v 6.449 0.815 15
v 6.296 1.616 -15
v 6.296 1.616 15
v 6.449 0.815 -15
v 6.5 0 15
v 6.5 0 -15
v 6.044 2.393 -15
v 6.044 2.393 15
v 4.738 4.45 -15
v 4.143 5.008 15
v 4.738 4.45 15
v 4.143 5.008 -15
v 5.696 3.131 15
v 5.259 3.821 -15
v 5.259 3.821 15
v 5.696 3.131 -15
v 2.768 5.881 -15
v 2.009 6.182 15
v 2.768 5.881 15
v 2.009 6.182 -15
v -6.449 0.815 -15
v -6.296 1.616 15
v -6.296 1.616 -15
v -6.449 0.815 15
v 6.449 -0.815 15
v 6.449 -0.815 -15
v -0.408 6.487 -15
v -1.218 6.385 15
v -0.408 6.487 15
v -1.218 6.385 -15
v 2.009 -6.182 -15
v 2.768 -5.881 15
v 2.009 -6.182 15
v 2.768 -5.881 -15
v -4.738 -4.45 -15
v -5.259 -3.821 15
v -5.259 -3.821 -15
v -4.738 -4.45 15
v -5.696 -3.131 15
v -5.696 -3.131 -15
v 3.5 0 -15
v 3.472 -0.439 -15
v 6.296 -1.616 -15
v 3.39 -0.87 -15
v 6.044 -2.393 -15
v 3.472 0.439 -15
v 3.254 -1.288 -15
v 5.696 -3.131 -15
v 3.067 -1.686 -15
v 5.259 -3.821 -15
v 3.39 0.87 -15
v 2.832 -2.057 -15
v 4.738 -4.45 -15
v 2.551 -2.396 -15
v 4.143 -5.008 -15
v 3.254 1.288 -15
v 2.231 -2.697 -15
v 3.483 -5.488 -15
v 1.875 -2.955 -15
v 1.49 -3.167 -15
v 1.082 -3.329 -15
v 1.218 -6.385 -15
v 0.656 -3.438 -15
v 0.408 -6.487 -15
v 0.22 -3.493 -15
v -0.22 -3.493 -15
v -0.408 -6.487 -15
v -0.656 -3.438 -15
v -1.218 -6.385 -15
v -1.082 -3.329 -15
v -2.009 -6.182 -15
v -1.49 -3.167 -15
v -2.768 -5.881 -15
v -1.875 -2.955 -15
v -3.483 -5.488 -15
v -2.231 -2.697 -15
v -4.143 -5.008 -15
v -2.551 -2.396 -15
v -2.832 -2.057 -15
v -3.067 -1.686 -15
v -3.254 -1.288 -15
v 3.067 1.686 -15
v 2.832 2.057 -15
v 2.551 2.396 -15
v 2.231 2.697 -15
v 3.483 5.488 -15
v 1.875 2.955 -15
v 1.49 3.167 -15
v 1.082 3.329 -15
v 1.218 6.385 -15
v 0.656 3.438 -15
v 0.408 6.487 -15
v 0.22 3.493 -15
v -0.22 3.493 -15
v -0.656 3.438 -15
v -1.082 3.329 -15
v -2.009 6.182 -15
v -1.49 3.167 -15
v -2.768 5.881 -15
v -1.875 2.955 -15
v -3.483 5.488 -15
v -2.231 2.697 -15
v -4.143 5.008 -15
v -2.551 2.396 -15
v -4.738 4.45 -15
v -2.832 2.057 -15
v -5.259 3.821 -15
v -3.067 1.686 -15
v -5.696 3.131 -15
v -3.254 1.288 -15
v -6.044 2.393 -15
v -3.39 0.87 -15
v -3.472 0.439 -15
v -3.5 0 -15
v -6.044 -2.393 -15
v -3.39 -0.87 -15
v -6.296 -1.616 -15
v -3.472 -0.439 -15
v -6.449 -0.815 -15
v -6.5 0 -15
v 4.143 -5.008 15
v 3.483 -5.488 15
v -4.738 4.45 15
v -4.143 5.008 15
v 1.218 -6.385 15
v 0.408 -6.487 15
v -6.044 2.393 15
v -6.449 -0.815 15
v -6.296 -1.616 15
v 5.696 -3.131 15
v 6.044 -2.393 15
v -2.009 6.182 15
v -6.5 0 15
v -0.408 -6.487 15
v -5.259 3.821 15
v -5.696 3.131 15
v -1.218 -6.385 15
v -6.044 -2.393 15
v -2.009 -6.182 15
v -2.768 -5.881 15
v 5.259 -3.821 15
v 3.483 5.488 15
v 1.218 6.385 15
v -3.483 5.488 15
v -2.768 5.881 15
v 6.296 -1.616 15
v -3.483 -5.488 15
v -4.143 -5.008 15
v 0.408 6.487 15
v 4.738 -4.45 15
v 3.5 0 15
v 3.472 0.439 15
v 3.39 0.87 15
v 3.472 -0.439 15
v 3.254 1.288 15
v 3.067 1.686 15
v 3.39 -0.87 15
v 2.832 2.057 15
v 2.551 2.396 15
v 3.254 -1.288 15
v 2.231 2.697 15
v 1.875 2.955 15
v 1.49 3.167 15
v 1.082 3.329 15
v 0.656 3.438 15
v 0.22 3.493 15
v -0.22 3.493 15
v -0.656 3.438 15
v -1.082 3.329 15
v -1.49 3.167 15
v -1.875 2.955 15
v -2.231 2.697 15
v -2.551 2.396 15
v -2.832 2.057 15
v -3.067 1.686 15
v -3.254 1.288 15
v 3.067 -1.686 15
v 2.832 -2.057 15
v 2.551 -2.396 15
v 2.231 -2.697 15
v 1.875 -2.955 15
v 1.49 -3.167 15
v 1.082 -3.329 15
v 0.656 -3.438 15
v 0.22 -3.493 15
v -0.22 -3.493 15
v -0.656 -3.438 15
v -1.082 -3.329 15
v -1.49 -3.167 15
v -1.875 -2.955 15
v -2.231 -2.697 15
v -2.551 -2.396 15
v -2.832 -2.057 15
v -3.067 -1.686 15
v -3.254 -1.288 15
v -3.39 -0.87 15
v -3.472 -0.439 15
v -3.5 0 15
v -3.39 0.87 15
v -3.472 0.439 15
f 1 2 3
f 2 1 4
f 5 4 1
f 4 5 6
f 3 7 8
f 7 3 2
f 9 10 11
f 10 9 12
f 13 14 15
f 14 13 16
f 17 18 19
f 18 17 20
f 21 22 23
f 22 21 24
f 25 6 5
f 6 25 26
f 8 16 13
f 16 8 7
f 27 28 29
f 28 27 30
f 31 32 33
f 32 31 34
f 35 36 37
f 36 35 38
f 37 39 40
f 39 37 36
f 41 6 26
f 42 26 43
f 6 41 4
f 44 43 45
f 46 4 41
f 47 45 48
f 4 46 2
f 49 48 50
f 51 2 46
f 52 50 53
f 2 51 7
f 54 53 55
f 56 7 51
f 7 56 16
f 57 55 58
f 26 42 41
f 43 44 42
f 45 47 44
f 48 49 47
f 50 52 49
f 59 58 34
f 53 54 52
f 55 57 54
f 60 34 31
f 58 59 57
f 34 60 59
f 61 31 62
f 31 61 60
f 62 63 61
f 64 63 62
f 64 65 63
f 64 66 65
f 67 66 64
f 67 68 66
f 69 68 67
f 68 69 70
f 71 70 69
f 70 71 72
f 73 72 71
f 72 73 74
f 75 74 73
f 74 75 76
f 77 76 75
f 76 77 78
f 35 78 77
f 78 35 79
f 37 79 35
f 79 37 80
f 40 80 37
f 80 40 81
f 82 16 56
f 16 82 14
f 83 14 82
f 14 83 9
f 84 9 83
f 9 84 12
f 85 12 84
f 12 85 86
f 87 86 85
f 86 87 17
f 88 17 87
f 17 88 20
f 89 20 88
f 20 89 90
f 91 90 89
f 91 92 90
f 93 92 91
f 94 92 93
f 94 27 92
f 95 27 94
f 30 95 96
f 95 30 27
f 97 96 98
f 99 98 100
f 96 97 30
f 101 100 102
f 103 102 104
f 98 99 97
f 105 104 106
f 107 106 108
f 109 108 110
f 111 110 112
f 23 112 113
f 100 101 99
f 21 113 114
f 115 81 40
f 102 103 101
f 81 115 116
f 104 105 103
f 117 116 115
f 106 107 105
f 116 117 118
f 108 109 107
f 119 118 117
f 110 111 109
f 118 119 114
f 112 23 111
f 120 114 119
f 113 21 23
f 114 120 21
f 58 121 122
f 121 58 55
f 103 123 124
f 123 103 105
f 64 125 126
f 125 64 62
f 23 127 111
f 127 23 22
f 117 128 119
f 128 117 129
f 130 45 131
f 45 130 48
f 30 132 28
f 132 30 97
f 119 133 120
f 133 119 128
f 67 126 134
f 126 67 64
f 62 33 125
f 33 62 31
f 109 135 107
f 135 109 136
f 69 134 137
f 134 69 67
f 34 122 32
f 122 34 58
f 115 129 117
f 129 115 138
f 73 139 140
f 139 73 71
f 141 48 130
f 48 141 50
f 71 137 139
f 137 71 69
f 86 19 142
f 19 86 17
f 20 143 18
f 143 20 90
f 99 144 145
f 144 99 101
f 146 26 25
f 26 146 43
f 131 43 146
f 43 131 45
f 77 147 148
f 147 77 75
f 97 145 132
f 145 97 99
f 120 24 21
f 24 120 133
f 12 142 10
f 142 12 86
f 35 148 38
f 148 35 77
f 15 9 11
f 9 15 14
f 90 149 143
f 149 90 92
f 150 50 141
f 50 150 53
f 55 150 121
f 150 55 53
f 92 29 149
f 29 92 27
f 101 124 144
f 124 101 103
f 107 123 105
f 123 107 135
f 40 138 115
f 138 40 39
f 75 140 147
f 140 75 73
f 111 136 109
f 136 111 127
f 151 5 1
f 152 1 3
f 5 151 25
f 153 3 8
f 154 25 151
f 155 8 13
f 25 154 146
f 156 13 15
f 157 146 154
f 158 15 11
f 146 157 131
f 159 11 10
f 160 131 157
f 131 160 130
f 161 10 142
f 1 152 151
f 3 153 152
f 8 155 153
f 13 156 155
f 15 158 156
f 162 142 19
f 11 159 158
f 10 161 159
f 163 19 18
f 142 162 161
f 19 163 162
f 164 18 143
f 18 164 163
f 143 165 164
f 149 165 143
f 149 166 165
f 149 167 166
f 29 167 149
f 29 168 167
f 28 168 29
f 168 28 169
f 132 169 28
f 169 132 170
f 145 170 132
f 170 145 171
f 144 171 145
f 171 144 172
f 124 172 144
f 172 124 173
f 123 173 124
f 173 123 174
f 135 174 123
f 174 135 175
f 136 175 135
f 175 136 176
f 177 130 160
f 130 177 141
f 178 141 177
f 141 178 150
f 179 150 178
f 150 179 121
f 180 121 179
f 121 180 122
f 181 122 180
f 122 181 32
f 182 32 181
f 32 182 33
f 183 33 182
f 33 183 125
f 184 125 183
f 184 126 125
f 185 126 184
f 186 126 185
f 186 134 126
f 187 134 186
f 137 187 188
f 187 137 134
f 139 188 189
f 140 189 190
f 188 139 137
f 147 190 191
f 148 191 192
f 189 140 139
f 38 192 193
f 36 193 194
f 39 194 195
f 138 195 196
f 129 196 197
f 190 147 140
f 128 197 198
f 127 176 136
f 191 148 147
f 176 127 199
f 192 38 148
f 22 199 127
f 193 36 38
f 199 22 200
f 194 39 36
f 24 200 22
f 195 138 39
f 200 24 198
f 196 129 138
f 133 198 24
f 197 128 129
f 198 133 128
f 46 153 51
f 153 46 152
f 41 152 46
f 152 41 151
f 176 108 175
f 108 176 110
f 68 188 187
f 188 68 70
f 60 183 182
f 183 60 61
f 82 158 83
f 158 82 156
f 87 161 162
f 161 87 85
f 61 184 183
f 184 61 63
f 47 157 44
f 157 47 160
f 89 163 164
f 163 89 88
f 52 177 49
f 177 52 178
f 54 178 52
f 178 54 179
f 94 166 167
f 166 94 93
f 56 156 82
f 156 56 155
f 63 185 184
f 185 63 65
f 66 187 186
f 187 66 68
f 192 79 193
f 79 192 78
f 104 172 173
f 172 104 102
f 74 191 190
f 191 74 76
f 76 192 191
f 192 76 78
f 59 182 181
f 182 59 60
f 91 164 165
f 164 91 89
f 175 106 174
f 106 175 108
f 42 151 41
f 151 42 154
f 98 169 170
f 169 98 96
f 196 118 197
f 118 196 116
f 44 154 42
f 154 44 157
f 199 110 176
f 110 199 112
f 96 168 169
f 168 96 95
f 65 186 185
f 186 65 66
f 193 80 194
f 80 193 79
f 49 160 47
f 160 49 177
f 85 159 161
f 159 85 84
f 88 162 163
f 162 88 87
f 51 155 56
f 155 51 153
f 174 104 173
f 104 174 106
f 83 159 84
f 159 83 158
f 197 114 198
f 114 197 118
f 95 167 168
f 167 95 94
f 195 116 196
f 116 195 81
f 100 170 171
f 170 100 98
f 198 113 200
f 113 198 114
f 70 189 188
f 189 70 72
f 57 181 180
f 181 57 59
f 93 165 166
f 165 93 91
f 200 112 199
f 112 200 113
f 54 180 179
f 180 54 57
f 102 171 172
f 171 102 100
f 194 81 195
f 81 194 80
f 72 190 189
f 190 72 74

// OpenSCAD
$fn = 50;


difference() {
	union() {
		translate(v = [0, 0, -15.0000000000]) {
			cylinder(h = 30, r = 6.5000000000);
		}
	}
	union() {
		translate(v = [0, 0, -100.0000000000]) {
			cylinder(h = 200, r = 3.5000000000);
		}
	}
}
